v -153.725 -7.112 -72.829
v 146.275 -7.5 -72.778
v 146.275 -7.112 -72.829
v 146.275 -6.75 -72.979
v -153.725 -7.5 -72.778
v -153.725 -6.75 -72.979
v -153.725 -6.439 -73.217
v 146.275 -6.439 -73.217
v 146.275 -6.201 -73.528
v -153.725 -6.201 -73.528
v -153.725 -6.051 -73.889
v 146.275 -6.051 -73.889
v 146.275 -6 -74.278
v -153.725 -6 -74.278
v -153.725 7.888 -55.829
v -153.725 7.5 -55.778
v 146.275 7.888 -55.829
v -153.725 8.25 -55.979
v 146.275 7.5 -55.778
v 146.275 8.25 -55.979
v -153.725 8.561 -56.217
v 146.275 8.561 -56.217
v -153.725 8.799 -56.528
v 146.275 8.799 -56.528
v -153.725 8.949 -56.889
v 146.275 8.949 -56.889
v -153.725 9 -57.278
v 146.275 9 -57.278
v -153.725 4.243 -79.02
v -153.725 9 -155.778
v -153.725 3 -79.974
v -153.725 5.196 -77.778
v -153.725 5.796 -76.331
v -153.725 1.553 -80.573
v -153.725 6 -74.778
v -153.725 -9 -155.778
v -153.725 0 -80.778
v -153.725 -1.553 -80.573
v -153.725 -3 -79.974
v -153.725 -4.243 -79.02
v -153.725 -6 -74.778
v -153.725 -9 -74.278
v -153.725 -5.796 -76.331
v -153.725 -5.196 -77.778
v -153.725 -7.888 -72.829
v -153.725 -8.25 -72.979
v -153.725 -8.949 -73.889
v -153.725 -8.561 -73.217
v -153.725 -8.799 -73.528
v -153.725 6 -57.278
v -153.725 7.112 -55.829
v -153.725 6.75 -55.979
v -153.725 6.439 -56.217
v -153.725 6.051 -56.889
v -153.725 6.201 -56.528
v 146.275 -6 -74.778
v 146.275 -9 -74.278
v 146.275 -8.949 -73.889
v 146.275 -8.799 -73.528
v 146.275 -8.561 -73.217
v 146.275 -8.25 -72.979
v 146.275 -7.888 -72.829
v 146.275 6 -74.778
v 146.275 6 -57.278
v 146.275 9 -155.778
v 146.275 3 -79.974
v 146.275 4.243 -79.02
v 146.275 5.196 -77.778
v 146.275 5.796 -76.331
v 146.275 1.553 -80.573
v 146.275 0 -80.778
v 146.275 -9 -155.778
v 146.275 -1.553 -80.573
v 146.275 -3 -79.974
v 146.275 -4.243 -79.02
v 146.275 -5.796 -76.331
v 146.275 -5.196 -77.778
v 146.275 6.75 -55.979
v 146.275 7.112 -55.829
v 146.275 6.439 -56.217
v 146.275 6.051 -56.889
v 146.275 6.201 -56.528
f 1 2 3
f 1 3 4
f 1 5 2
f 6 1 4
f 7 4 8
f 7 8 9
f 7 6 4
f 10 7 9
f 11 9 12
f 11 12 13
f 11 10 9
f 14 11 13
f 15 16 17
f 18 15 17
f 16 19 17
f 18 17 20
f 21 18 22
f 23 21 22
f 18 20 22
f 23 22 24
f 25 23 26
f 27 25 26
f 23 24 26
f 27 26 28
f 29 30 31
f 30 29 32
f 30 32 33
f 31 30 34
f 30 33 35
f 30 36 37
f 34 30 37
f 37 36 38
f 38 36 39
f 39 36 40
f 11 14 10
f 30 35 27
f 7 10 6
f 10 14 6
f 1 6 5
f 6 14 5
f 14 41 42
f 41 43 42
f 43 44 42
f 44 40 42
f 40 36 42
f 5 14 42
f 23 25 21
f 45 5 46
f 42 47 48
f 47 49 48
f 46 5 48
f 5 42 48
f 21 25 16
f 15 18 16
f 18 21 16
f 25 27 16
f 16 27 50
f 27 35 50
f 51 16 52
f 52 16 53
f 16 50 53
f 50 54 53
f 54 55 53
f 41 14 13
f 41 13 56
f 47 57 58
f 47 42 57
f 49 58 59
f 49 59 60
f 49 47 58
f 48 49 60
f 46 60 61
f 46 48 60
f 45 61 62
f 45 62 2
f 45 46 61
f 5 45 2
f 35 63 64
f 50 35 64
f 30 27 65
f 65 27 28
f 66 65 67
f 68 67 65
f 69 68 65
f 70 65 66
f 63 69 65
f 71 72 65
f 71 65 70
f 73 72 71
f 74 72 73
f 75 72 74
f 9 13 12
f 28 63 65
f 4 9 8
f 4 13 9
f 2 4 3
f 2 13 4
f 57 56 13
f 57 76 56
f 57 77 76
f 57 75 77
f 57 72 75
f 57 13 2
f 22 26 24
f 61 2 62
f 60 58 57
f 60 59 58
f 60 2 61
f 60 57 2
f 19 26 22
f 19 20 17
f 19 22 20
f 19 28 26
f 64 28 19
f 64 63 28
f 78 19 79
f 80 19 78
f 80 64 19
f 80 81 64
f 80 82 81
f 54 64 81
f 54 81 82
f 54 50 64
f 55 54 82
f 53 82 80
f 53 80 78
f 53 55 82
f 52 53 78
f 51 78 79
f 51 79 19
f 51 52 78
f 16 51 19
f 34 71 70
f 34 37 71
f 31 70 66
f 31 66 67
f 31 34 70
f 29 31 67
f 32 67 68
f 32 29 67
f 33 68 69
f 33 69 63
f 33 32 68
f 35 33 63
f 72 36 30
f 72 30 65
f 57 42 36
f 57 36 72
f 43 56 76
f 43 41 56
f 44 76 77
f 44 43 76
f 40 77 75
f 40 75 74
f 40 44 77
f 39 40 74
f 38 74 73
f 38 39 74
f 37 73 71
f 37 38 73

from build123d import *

# Parameters (mm, degrees)
F0_W     = 300
F0_H     = 100
F1_DEPTH = 9
F3_DEPTH = 300.001
F4_R     = 1.49999
F5_R     = 5.99999


# Not quite as in the source:
# - a fillet or chamfer is up to 0.001 mm smaller than in the source, because OpenCascade refuses the exact size


with BuildPart() as f1:
    # F0 (on Front) → F1 (new body, symmetric)
    with BuildSketch(Plane.XZ):
        with Locations((-3.7248600274, -105.7776198197)):
            Rectangle(F0_W, F0_H)
    extrude(amount=F1_DEPTH, both=True)

    # F2 (on face) → F3 (cut, through all)
    with BuildSketch(Plane.YZ.offset(146.2751399726)):
        Polygon((6, -55.7776198197), (-9, -55.7776198197), (-9, -72.7776198197), (-6, -72.7776198197), (-6, -80.7776198197), (6, -80.7776198197), align=None)
    extrude(amount=-F3_DEPTH, mode=Mode.SUBTRACT)

    # F4 (radius 1.5 in the source; OpenCascade refuses exactly that, so slightly less here)
    f4_edges = [f1.edges().sort_by_distance(p)[0] for p in [
        (-3.72486, 6, -55.77762),
        (-3.72486, 9, -55.77762),
        (-3.72486, -9, -72.77762),
        (-3.72486, -6, -72.77762),
    ]]
    fillet(f4_edges, radius=F4_R)

    # F5 (radius 6 in the source; OpenCascade refuses exactly that, so slightly less here)
    f5_edges = [f1.edges().sort_by_distance(p)[0] for p in [
        (-3.72486, 6, -80.77762),
        (-3.72486, -6, -80.77762),
    ]]
    fillet(f5_edges, radius=F5_R)


solid = f1.part
